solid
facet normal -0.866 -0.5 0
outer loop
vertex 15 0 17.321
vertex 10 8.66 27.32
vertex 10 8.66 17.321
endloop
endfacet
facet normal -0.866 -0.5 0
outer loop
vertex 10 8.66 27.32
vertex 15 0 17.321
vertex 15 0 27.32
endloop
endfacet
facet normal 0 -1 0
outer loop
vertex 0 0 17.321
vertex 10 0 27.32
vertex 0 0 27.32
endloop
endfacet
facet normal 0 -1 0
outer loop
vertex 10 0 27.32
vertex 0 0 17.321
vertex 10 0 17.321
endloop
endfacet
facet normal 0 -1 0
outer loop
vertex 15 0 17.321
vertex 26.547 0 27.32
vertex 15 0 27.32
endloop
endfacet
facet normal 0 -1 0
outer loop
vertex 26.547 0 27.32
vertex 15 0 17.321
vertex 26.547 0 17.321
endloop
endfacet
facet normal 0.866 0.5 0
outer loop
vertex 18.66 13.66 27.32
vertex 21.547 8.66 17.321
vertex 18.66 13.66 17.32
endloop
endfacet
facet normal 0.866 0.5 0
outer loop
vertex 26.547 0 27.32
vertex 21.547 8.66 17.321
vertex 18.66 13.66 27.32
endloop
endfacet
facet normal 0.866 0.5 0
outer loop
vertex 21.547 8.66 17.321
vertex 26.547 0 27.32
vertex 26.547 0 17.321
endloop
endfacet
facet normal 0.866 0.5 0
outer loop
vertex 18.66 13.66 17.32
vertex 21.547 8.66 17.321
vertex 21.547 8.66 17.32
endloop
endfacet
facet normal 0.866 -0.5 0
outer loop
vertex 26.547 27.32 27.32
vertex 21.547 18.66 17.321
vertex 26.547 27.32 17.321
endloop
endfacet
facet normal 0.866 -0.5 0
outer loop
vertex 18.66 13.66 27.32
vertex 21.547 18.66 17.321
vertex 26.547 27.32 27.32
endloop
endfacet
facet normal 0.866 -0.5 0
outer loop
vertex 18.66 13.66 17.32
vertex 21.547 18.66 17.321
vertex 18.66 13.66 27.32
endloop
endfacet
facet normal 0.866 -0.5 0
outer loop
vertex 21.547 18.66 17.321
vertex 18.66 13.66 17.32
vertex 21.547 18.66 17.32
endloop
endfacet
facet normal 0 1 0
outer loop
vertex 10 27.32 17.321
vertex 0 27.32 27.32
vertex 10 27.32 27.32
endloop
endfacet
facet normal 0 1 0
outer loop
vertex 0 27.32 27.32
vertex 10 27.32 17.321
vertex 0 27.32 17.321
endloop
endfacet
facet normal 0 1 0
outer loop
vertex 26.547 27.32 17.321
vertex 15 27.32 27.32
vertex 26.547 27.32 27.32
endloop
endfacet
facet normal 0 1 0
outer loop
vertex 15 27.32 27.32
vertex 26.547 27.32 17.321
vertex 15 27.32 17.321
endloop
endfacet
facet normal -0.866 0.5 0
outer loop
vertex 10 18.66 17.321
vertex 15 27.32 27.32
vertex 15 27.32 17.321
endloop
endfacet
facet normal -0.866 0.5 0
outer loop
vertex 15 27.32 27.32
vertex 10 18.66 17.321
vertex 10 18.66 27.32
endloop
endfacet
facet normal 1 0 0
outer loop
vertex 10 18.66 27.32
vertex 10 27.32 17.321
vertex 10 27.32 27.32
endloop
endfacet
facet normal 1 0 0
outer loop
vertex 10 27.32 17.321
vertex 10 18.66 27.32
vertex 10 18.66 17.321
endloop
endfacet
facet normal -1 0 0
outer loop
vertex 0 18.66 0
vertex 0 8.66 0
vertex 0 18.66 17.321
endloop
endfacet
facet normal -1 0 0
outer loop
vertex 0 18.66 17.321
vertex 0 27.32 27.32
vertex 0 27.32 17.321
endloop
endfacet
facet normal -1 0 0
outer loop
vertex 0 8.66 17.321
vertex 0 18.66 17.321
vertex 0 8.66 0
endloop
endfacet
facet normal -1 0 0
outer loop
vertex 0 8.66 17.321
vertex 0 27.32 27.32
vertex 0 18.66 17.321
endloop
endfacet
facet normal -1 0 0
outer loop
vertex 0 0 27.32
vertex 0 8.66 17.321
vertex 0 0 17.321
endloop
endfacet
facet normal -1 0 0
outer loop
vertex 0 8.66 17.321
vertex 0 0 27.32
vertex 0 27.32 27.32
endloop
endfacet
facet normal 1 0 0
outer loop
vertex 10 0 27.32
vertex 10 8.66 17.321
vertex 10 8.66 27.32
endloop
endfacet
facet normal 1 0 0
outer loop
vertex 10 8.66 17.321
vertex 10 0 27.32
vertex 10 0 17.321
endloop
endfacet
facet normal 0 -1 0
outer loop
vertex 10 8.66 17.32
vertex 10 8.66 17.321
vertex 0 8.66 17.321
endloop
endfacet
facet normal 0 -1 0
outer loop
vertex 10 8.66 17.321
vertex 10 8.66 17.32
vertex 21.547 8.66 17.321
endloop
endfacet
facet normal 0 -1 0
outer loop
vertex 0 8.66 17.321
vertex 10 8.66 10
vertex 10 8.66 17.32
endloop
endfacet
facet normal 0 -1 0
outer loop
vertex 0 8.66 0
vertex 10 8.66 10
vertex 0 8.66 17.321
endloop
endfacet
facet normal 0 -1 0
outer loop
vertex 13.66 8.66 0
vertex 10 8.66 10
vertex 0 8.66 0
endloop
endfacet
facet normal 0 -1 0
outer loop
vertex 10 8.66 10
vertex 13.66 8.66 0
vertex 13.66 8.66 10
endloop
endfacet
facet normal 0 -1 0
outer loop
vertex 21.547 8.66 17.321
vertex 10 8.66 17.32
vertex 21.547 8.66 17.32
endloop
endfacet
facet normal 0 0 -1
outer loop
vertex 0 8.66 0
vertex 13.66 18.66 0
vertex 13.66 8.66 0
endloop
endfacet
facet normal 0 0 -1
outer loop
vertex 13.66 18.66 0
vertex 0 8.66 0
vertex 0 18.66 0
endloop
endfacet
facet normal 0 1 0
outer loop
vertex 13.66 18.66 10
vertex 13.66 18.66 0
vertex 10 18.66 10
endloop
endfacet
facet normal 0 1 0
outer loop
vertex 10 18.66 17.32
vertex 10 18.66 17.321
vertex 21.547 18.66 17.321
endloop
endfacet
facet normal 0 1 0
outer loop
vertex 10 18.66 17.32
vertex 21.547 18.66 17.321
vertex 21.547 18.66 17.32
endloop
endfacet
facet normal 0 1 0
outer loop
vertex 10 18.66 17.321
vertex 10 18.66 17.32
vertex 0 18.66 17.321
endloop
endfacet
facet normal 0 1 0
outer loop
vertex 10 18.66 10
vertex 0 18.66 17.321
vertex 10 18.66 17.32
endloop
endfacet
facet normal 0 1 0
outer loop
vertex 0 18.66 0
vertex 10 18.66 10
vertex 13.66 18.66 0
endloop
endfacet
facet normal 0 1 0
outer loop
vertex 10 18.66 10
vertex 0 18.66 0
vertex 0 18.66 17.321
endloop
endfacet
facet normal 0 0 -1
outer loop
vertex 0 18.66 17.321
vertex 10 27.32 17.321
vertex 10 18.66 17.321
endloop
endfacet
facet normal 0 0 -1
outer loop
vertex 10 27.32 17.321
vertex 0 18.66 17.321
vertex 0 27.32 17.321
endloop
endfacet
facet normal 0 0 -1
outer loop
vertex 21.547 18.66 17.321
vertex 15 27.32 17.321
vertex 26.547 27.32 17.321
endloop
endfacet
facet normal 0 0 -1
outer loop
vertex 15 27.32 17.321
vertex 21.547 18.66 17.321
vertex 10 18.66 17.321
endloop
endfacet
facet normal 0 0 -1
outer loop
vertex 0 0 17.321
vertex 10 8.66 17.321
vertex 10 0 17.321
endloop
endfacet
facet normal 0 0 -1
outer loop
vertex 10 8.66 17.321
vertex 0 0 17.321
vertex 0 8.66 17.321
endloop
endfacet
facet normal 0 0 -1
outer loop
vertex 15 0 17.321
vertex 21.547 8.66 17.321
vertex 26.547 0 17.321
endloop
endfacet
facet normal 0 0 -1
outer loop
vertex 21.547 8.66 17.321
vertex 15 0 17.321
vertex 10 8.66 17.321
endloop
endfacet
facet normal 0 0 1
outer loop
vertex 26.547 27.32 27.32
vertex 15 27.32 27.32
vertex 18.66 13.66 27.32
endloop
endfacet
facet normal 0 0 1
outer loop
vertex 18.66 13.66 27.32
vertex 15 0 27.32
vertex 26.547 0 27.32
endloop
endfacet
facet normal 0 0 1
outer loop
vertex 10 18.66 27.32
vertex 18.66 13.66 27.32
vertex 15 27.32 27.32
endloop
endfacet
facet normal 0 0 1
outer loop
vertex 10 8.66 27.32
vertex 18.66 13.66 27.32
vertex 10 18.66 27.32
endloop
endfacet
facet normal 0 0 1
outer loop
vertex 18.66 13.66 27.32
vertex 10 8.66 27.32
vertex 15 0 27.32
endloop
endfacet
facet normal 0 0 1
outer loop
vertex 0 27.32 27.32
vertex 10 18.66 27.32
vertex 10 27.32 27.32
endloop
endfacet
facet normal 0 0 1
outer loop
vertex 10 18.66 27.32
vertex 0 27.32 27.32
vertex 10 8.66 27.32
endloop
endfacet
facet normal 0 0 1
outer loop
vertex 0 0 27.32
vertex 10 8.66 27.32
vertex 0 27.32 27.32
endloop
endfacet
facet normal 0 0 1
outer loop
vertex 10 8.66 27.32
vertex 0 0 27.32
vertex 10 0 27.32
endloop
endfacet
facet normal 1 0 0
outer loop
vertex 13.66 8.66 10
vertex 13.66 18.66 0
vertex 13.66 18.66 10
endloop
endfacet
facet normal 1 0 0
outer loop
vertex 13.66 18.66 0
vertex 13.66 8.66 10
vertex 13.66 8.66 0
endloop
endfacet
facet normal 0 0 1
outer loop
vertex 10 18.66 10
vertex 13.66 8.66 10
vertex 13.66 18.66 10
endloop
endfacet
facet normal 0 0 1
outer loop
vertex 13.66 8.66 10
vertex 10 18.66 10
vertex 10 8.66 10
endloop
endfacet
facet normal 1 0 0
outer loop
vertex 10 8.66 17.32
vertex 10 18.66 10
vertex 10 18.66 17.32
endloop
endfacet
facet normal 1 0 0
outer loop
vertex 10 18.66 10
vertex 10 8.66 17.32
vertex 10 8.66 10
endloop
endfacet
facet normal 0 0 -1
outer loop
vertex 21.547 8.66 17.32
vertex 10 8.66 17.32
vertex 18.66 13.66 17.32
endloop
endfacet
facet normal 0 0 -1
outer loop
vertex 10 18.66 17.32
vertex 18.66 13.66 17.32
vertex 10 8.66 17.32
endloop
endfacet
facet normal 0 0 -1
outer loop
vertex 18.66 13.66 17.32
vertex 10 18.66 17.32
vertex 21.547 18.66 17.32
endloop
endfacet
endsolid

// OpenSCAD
a = 10.0;
r3 = sqrt(3.0);

r = a;
g = r3 * a / 2;
b = a / 2;
m = 2 * a / r3;
y = g - b;
TH = r + g + g;
KH = g + r + g;
intersection()
{
// K
linear_extrude(height=g+r+g) // J's width
polygon(points=[
	[0, 0], [r, 0], [r, g], [r+b, 0],
	[r+b+m, 0], [r+g, g+b], [r+b+m, g+r+g],
	[r+b, g+r+g], [r, g+r], [r, g+r+g], [0, g+r+g]]);

// T
translate([0, 0, TH])
rotate(v=[0,1,0], a=90)
linear_extrude(height=r+b+m) // K's width
polygon(points=[
	[0, 0], [r, 0], [r, g], [r+g+g, g],
	[r+g+g, g+r], [r, g+r], [r, g+r+g], [0, g+r+g]]);

// J
translate([0, KH, 0])
rotate(v=[1,0,0], a=90)
linear_extrude(height=g+r+g) // K's height
union()
{
    polygon(points=[
	    [r+y, g+g], [r+b+m, g+g],
	    [r+b+m, g+g+r], [r+y, g+g+r]]);
    intersection()
    {
	difference()
	{
	    translate([r+y, r+y, 0]) square(r+g+g, center=true);
	    translate([r+y, r+y, 0]) square(y+y, center=true);
	}
	square([r+y, g+g+r]);
    }
}
}
